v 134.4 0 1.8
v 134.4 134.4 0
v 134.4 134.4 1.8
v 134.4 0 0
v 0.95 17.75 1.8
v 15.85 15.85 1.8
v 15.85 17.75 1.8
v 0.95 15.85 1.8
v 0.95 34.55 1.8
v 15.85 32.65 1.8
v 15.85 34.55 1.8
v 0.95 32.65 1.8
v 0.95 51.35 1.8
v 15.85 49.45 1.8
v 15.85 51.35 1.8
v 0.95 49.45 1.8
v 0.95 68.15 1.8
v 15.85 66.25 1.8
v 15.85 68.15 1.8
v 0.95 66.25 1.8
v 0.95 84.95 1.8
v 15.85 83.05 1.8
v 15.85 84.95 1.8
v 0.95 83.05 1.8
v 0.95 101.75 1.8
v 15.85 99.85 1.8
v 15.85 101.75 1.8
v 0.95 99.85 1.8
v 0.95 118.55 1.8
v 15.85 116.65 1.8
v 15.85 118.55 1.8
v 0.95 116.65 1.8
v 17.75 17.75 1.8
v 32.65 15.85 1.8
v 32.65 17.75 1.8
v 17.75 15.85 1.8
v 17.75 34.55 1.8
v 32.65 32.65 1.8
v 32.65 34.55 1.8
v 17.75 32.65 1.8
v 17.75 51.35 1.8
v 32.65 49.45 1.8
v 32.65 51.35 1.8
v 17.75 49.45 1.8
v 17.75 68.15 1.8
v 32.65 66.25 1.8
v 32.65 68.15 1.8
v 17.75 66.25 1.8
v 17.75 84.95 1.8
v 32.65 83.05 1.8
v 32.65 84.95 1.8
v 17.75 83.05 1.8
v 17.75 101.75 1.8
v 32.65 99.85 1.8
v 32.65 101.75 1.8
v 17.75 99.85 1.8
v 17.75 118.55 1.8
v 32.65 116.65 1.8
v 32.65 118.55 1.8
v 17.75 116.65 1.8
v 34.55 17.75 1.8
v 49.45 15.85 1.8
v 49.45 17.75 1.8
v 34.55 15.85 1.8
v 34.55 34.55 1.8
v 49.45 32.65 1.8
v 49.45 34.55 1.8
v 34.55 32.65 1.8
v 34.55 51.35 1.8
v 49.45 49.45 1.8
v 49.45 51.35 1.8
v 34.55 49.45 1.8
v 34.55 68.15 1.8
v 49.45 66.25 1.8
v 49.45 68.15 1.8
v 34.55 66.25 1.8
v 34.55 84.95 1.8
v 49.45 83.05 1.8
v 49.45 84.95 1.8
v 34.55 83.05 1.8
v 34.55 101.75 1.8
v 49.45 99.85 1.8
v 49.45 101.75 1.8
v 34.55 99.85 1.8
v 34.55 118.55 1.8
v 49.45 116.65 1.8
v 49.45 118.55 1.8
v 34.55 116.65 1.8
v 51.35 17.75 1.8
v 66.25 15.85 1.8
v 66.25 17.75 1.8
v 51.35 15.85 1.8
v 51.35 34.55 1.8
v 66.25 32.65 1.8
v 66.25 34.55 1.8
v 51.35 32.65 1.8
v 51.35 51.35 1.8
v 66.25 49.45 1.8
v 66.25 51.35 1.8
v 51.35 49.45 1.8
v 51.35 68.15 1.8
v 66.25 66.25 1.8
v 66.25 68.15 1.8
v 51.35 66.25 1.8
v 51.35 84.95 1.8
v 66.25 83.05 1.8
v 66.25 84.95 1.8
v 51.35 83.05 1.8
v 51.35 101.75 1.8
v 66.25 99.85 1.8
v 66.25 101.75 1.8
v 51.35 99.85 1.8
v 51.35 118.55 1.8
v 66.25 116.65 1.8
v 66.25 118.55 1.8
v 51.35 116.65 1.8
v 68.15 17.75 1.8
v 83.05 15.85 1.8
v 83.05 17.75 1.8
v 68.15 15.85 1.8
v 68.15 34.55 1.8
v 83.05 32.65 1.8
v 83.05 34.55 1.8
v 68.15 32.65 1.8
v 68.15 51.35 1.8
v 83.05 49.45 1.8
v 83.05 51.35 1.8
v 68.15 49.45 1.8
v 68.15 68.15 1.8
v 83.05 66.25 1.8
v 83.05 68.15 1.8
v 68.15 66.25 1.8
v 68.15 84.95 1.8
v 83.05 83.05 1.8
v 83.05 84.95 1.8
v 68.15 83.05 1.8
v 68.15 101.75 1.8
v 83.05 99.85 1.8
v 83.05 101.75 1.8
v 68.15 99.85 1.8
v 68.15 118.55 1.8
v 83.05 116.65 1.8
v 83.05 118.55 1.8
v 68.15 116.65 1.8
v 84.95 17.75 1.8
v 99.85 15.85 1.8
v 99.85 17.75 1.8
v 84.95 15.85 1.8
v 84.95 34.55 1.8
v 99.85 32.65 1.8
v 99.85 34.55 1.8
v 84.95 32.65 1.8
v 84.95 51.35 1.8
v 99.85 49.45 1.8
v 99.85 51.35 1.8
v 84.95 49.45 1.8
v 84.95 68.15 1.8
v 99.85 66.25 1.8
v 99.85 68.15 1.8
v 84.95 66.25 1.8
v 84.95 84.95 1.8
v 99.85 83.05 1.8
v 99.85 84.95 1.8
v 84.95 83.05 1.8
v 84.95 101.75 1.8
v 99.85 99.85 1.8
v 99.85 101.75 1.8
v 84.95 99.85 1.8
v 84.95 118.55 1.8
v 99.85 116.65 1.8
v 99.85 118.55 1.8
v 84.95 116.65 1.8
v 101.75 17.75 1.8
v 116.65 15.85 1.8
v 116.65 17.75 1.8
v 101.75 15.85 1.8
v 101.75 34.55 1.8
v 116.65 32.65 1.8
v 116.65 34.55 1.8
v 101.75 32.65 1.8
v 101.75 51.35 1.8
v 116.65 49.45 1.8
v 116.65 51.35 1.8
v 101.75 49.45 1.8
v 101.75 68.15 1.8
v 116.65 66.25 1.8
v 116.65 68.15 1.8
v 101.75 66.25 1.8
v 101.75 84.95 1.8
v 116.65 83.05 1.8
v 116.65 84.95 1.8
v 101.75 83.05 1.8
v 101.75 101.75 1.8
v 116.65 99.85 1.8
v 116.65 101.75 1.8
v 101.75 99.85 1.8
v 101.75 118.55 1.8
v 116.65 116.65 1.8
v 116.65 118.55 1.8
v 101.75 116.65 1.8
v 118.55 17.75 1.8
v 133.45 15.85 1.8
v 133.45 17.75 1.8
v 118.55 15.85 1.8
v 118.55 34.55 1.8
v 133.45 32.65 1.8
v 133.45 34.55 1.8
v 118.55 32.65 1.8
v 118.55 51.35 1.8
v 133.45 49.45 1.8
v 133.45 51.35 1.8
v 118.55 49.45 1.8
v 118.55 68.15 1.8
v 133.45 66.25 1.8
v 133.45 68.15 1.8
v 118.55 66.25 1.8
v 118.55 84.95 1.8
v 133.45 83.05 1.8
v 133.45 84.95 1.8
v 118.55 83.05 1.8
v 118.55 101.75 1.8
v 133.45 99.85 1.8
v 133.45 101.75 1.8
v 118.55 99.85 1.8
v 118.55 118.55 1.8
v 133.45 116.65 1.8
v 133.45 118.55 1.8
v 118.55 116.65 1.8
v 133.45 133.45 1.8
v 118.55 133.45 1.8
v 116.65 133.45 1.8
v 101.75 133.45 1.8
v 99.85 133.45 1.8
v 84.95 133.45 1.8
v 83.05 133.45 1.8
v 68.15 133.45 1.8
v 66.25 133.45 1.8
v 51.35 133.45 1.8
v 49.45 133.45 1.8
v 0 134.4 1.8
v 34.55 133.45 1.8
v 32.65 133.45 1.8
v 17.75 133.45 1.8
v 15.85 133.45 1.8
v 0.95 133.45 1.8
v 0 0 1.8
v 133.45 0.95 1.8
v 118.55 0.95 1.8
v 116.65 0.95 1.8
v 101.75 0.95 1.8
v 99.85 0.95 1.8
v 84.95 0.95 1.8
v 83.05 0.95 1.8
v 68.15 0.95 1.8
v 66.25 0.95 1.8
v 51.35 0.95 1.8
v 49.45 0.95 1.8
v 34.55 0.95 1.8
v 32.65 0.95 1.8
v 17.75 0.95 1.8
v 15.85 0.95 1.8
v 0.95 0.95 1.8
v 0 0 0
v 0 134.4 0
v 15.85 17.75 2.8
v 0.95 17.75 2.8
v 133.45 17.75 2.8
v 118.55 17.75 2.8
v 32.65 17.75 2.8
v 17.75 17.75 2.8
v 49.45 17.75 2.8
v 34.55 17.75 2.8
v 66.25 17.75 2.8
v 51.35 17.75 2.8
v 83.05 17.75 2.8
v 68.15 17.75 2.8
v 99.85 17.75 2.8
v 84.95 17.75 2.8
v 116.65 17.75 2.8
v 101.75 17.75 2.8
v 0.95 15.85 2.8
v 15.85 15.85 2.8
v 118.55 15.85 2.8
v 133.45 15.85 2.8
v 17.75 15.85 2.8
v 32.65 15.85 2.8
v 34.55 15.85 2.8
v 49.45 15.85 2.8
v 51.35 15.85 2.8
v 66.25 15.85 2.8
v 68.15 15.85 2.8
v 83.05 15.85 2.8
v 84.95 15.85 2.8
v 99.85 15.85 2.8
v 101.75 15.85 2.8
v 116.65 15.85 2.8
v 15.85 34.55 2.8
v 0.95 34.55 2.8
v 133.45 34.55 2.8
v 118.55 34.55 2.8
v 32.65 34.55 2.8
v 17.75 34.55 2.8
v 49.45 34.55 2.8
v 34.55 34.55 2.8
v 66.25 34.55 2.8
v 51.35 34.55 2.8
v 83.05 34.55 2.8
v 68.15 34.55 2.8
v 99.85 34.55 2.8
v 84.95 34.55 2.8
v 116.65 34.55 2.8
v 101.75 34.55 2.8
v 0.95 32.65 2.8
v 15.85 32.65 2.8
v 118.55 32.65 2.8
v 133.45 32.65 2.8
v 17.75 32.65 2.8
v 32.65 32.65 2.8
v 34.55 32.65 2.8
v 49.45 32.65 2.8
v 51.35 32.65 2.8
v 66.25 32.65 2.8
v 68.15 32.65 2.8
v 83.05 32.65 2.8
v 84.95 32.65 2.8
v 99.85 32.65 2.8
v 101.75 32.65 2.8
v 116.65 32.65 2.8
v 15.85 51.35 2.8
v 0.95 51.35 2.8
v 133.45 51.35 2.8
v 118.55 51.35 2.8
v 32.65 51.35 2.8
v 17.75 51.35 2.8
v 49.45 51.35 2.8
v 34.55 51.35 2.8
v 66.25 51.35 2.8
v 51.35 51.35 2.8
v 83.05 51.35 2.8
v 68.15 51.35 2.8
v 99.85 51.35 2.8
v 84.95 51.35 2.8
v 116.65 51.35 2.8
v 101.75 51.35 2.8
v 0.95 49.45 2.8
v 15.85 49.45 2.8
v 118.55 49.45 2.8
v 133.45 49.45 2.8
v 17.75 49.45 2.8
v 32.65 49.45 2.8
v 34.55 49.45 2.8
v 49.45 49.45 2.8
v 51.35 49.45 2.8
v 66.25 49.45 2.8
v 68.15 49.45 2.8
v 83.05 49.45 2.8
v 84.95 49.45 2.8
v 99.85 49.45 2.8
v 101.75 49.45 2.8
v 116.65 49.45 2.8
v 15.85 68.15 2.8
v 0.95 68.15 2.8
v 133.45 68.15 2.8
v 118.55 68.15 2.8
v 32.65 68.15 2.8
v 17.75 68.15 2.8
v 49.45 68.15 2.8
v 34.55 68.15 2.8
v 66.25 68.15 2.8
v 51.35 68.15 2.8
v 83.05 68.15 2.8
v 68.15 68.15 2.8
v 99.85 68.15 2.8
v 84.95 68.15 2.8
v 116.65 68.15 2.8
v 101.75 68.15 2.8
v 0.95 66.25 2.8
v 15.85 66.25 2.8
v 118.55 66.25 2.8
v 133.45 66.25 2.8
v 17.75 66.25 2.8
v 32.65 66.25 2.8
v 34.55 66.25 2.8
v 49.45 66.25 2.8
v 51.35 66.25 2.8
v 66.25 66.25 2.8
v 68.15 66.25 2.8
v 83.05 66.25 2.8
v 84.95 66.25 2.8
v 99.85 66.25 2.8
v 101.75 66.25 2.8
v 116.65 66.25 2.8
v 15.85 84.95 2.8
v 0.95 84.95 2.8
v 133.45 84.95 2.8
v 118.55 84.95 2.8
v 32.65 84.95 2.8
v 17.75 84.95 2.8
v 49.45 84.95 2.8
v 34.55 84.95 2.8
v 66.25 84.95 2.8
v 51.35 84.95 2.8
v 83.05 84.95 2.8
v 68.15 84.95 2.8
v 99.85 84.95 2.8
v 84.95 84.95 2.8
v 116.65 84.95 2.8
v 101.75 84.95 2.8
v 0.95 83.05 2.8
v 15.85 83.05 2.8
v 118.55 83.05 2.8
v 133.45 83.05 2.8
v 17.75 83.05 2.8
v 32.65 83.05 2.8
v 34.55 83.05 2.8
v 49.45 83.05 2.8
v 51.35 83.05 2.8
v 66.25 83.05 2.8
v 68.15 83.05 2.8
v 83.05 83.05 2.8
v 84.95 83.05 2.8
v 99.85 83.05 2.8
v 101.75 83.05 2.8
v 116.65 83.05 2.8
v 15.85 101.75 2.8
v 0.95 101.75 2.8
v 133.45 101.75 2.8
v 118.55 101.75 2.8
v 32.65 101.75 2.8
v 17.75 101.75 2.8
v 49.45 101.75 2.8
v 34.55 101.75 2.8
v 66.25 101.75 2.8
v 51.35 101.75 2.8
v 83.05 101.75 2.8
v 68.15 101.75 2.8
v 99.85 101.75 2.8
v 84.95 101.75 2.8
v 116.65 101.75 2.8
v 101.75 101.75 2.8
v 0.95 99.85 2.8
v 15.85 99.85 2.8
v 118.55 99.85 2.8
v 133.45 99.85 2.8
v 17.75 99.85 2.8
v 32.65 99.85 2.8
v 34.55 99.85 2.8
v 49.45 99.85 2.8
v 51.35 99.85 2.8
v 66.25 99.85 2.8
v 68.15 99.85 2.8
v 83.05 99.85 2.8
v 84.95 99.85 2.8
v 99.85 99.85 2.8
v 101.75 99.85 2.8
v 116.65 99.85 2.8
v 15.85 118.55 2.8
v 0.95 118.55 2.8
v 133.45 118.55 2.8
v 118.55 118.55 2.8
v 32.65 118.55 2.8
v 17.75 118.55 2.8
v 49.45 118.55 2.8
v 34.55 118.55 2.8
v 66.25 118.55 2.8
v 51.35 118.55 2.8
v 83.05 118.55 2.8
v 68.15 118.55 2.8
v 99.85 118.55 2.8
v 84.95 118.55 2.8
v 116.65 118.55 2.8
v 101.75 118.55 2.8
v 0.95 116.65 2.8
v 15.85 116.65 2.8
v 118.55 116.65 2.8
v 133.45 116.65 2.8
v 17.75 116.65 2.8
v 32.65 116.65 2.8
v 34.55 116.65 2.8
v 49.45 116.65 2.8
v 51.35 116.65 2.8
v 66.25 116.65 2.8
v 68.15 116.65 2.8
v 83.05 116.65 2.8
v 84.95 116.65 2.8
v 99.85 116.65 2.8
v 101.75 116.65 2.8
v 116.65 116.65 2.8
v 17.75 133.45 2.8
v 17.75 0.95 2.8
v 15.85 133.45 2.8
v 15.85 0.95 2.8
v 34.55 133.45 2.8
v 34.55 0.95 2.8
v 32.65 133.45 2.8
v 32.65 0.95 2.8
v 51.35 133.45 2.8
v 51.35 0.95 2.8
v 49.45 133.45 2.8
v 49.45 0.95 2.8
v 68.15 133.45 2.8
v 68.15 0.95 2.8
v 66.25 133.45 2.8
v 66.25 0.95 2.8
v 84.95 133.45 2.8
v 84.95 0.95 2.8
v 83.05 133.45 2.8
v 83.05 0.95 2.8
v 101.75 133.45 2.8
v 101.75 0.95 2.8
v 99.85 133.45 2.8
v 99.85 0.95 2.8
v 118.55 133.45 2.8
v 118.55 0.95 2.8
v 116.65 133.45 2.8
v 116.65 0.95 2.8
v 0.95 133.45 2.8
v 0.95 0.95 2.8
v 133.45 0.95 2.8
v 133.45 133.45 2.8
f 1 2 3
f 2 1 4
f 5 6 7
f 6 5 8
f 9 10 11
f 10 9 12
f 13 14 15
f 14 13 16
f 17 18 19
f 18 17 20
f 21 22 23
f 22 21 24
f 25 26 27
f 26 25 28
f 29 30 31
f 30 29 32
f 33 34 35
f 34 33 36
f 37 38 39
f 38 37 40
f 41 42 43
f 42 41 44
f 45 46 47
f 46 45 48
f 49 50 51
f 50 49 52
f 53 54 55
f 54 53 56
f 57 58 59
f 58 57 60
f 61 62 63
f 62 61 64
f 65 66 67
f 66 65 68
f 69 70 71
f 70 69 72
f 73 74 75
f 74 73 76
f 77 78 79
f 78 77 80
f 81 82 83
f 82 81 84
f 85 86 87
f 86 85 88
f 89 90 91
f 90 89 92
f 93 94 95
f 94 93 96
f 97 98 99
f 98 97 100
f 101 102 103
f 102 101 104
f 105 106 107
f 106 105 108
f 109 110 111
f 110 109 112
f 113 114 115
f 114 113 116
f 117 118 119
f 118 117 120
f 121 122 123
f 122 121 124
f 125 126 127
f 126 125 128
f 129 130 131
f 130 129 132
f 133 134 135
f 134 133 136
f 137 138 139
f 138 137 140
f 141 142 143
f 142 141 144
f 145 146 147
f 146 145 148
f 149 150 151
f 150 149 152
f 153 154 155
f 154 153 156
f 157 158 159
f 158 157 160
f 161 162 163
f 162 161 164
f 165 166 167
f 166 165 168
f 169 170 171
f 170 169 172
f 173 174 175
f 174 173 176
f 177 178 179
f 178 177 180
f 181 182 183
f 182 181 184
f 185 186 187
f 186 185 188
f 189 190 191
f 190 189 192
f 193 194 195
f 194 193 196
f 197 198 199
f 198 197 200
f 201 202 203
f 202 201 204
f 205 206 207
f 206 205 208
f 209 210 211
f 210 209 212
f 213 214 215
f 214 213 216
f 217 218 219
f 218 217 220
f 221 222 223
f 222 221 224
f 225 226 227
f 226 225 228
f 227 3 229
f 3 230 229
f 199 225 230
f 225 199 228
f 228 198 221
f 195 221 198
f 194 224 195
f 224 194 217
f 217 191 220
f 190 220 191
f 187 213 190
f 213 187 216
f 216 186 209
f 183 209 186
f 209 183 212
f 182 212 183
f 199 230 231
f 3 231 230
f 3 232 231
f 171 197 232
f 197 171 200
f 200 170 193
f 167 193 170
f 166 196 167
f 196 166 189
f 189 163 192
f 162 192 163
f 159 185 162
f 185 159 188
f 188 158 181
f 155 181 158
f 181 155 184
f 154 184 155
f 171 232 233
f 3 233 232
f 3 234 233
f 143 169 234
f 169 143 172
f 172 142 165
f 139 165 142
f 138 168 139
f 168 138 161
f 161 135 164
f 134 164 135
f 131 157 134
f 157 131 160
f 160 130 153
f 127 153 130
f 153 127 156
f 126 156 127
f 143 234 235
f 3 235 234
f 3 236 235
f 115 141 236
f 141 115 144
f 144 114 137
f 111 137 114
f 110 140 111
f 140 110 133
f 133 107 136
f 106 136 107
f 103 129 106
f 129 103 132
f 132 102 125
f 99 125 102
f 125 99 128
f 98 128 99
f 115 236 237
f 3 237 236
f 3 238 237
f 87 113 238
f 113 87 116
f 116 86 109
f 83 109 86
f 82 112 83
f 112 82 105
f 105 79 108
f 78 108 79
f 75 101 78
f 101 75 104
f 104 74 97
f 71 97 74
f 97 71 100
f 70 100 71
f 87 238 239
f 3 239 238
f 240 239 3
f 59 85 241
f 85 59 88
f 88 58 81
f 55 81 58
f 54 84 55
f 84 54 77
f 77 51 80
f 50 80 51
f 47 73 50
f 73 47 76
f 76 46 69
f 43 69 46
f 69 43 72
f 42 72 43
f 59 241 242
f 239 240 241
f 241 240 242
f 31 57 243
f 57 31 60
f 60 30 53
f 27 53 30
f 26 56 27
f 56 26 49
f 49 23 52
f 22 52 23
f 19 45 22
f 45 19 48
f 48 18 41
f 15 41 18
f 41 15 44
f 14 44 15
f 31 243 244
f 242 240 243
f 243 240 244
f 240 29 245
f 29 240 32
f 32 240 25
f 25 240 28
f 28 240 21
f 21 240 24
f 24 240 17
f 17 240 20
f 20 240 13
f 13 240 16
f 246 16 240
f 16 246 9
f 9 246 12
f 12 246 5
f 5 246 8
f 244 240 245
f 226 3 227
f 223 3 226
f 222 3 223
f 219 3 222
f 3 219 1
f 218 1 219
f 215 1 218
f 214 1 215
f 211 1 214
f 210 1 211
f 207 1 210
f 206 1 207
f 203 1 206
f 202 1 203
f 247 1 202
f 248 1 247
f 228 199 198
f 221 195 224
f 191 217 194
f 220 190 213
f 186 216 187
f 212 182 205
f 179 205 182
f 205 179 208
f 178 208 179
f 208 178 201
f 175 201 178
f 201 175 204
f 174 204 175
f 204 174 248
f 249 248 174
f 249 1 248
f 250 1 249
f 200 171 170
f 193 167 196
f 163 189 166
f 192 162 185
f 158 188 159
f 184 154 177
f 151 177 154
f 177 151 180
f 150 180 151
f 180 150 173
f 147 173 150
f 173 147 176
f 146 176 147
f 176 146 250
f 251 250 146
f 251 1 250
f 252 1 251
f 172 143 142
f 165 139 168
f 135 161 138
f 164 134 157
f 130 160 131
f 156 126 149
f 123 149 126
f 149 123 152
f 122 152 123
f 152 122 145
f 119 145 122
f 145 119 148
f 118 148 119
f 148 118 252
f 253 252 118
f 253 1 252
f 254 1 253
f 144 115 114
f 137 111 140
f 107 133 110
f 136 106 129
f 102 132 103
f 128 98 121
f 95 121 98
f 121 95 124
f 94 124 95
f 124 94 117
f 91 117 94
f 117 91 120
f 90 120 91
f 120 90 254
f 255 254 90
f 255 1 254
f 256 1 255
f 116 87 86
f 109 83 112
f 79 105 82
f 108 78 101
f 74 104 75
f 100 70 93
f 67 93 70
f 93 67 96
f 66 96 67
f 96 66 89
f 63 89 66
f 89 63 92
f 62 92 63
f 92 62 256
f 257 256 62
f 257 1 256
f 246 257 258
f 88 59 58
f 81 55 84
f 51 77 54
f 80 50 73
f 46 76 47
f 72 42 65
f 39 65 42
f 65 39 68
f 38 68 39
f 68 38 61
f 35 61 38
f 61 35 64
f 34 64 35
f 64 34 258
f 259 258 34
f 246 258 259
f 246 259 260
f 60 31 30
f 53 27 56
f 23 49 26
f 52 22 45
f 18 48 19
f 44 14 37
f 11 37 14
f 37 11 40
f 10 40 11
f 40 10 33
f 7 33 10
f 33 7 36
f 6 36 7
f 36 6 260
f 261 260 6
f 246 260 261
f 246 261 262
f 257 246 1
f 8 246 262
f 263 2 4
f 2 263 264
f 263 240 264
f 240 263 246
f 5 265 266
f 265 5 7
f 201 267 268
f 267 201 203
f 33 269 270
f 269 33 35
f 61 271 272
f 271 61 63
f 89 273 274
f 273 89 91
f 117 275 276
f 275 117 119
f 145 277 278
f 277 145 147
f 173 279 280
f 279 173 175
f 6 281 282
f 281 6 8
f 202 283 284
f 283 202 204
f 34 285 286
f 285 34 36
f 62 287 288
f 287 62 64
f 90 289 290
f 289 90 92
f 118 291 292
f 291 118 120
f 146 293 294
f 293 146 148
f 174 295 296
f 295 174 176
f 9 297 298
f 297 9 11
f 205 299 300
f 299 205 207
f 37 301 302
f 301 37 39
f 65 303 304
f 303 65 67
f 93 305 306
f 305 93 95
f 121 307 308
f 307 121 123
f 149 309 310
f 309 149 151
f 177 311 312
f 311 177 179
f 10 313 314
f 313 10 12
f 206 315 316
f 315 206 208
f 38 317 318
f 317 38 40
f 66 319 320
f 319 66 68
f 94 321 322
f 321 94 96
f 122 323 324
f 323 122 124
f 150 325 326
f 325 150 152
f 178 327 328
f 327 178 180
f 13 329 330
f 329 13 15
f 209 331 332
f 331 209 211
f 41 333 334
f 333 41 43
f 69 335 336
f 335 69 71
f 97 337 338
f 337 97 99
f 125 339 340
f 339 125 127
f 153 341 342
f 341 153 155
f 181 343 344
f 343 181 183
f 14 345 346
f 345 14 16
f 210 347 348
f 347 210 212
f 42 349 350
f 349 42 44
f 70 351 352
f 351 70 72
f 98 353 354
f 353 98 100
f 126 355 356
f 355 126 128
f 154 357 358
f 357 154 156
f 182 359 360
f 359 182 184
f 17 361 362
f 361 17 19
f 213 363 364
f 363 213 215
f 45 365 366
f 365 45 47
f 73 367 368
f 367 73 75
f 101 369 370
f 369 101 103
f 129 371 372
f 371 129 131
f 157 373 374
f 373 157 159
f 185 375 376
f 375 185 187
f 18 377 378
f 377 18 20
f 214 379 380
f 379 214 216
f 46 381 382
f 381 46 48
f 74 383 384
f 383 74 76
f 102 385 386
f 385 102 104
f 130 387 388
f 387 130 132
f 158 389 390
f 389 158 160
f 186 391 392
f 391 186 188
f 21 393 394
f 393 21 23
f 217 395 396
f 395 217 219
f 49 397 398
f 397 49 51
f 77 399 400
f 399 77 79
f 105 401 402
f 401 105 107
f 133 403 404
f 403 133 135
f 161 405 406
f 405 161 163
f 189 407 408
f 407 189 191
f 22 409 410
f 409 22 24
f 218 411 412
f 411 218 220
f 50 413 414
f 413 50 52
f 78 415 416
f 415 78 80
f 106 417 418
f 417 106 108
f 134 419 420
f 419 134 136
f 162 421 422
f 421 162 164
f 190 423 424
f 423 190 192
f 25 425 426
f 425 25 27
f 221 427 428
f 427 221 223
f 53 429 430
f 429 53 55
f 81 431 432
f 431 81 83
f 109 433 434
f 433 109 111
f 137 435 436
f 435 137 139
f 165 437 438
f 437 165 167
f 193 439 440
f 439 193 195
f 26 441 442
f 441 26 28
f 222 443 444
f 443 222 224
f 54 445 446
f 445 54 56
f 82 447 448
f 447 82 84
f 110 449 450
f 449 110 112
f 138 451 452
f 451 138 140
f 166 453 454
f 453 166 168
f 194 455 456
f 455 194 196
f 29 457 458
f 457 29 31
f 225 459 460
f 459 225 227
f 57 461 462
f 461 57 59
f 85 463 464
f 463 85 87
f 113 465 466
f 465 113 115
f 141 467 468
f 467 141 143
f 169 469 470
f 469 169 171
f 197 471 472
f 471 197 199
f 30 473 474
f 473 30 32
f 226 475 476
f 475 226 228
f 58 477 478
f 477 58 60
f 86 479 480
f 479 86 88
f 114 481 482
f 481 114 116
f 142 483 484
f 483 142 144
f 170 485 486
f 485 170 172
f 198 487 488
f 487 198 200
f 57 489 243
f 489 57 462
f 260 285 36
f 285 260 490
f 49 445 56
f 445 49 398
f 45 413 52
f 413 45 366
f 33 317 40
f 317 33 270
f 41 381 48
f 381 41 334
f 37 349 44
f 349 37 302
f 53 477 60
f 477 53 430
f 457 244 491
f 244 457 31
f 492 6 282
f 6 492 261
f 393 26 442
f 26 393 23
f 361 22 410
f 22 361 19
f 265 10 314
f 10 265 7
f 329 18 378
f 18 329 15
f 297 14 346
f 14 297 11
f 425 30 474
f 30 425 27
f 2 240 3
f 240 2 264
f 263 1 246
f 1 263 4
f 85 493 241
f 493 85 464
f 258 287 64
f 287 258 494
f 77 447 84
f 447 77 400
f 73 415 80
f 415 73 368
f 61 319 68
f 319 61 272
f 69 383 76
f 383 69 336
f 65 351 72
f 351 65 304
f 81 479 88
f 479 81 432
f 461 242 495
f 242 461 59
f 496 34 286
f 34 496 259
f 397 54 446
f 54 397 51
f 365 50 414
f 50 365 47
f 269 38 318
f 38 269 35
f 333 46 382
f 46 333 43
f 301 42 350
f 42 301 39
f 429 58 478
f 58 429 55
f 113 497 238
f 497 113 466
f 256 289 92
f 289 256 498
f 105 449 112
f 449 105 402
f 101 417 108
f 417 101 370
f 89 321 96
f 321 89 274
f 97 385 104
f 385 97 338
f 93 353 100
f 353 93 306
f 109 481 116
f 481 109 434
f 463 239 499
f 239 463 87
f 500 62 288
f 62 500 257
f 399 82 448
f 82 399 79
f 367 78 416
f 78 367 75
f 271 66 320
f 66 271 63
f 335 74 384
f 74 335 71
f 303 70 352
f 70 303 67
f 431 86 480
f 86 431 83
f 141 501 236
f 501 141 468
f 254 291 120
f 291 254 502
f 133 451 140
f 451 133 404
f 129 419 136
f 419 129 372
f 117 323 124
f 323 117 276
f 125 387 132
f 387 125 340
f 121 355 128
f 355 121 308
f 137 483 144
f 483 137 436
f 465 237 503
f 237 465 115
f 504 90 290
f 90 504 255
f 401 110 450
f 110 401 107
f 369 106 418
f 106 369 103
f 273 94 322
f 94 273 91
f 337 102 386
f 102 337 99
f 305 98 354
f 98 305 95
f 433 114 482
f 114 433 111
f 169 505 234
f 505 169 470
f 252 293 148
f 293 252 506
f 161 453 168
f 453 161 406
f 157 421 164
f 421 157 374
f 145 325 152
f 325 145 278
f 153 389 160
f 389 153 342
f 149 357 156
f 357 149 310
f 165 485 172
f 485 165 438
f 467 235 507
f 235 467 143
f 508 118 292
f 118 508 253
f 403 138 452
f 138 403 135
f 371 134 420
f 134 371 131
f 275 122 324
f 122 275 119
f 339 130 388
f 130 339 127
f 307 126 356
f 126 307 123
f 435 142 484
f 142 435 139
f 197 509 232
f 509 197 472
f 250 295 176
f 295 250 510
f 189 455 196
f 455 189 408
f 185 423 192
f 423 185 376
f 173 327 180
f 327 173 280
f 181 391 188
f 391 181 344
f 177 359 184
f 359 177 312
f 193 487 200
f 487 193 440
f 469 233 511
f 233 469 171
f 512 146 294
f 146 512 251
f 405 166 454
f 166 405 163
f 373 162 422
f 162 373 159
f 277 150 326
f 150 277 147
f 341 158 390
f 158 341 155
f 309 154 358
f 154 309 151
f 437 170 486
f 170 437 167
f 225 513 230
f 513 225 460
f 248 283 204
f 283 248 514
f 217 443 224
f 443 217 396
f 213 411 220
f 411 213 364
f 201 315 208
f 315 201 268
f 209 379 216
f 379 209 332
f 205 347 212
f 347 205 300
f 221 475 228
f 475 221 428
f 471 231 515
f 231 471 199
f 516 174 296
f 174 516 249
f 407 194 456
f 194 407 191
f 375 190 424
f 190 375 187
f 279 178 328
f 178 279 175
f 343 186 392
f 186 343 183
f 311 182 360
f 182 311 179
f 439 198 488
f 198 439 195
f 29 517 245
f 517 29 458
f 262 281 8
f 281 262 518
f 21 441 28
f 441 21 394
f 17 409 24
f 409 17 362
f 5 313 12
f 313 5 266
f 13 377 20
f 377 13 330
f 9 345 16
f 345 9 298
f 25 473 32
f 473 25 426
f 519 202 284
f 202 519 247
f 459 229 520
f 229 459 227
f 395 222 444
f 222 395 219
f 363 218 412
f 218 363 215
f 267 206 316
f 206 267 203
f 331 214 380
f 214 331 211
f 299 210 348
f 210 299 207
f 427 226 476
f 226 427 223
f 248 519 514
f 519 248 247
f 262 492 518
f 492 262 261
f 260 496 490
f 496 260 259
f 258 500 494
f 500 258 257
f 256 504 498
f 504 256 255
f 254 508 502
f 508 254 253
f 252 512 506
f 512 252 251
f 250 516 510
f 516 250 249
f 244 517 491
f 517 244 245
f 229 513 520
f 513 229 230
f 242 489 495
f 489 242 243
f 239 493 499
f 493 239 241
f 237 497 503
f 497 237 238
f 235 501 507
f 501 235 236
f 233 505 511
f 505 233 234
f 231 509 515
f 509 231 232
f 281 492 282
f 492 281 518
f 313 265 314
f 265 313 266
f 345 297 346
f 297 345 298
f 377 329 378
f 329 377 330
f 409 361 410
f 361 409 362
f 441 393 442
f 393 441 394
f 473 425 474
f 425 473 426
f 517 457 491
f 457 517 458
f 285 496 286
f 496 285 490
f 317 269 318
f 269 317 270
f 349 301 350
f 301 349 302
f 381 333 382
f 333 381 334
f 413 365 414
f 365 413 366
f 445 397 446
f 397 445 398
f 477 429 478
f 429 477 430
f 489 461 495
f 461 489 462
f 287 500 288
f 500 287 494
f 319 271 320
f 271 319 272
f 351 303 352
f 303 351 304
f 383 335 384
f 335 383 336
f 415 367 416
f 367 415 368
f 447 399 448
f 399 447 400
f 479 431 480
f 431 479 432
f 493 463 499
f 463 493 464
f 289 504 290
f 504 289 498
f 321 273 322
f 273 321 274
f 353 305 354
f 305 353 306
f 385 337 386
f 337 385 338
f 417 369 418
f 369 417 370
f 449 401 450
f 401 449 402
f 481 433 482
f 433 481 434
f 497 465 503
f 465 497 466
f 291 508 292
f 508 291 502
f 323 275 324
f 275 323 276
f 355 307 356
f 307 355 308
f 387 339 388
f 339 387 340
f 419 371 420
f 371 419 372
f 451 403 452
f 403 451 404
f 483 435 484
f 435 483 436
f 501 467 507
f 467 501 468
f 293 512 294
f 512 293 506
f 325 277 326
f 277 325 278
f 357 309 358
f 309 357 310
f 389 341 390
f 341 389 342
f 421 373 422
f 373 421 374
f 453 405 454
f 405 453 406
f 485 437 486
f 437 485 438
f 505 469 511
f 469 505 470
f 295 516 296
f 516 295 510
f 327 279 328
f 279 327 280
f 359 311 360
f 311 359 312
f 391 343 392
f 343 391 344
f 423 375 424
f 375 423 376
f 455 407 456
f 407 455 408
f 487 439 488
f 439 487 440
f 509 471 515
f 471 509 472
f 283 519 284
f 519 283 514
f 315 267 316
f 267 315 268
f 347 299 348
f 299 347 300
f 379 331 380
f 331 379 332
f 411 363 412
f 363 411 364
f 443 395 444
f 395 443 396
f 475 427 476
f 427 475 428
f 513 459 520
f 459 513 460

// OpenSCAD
spacing = 1.90; // The spacing inbetween two of the boxes, this spacing is colored black and half size on the rim of the plate
boxSize = 14.90;
boxHeight = 1.00; // The amount it extrudes from the base plate
plateHeight = 1.80; // base plate height
countX = 8;
countY = 8;

colorBox = "white";
colorPadding = "black";

////// CODE BELOW ////

// Calculate total dimensions
totalWidth = (countX * boxSize) + (countX * spacing);
totalDepth = (countY * boxSize) + (countY * spacing);

// Create horizontal/vertical black padding strips
color(colorPadding) {
    for (y = [1:countY-1]) {
        translate([0, y * (boxSize + spacing) - spacing/2, 0])
            cube([totalWidth, spacing, plateHeight]);
    }
    
    for (x = [1:countX-1]) {
        translate([x * (boxSize + spacing) - spacing/2, 0, 0])
            cube([spacing, totalDepth, plateHeight]);
    }

    translate([0, 0, 0])
        cube([spacing/2, totalDepth, plateHeight]);
    translate([countX * (boxSize + spacing) - spacing/2, 0, 0])
        cube([spacing/2, totalDepth, plateHeight]);
    
    translate([0, 0, 0])
        cube([totalWidth, spacing/2, plateHeight]);
    translate([0,countY * (boxSize + spacing) - spacing/2, 0])
        cube([totalWidth, spacing/2, plateHeight]);
}

// Create raised boxes (white)
color(colorBox)
    for (x = [0:countX-1]) {
        for (y = [0:countY-1]) {
            translate([spacing/2 + x * (boxSize + spacing), 
                      spacing/2 + y * (boxSize + spacing), 
                      0])
                cube([boxSize, boxSize, boxHeight+ plateHeight]);
        }
    }
